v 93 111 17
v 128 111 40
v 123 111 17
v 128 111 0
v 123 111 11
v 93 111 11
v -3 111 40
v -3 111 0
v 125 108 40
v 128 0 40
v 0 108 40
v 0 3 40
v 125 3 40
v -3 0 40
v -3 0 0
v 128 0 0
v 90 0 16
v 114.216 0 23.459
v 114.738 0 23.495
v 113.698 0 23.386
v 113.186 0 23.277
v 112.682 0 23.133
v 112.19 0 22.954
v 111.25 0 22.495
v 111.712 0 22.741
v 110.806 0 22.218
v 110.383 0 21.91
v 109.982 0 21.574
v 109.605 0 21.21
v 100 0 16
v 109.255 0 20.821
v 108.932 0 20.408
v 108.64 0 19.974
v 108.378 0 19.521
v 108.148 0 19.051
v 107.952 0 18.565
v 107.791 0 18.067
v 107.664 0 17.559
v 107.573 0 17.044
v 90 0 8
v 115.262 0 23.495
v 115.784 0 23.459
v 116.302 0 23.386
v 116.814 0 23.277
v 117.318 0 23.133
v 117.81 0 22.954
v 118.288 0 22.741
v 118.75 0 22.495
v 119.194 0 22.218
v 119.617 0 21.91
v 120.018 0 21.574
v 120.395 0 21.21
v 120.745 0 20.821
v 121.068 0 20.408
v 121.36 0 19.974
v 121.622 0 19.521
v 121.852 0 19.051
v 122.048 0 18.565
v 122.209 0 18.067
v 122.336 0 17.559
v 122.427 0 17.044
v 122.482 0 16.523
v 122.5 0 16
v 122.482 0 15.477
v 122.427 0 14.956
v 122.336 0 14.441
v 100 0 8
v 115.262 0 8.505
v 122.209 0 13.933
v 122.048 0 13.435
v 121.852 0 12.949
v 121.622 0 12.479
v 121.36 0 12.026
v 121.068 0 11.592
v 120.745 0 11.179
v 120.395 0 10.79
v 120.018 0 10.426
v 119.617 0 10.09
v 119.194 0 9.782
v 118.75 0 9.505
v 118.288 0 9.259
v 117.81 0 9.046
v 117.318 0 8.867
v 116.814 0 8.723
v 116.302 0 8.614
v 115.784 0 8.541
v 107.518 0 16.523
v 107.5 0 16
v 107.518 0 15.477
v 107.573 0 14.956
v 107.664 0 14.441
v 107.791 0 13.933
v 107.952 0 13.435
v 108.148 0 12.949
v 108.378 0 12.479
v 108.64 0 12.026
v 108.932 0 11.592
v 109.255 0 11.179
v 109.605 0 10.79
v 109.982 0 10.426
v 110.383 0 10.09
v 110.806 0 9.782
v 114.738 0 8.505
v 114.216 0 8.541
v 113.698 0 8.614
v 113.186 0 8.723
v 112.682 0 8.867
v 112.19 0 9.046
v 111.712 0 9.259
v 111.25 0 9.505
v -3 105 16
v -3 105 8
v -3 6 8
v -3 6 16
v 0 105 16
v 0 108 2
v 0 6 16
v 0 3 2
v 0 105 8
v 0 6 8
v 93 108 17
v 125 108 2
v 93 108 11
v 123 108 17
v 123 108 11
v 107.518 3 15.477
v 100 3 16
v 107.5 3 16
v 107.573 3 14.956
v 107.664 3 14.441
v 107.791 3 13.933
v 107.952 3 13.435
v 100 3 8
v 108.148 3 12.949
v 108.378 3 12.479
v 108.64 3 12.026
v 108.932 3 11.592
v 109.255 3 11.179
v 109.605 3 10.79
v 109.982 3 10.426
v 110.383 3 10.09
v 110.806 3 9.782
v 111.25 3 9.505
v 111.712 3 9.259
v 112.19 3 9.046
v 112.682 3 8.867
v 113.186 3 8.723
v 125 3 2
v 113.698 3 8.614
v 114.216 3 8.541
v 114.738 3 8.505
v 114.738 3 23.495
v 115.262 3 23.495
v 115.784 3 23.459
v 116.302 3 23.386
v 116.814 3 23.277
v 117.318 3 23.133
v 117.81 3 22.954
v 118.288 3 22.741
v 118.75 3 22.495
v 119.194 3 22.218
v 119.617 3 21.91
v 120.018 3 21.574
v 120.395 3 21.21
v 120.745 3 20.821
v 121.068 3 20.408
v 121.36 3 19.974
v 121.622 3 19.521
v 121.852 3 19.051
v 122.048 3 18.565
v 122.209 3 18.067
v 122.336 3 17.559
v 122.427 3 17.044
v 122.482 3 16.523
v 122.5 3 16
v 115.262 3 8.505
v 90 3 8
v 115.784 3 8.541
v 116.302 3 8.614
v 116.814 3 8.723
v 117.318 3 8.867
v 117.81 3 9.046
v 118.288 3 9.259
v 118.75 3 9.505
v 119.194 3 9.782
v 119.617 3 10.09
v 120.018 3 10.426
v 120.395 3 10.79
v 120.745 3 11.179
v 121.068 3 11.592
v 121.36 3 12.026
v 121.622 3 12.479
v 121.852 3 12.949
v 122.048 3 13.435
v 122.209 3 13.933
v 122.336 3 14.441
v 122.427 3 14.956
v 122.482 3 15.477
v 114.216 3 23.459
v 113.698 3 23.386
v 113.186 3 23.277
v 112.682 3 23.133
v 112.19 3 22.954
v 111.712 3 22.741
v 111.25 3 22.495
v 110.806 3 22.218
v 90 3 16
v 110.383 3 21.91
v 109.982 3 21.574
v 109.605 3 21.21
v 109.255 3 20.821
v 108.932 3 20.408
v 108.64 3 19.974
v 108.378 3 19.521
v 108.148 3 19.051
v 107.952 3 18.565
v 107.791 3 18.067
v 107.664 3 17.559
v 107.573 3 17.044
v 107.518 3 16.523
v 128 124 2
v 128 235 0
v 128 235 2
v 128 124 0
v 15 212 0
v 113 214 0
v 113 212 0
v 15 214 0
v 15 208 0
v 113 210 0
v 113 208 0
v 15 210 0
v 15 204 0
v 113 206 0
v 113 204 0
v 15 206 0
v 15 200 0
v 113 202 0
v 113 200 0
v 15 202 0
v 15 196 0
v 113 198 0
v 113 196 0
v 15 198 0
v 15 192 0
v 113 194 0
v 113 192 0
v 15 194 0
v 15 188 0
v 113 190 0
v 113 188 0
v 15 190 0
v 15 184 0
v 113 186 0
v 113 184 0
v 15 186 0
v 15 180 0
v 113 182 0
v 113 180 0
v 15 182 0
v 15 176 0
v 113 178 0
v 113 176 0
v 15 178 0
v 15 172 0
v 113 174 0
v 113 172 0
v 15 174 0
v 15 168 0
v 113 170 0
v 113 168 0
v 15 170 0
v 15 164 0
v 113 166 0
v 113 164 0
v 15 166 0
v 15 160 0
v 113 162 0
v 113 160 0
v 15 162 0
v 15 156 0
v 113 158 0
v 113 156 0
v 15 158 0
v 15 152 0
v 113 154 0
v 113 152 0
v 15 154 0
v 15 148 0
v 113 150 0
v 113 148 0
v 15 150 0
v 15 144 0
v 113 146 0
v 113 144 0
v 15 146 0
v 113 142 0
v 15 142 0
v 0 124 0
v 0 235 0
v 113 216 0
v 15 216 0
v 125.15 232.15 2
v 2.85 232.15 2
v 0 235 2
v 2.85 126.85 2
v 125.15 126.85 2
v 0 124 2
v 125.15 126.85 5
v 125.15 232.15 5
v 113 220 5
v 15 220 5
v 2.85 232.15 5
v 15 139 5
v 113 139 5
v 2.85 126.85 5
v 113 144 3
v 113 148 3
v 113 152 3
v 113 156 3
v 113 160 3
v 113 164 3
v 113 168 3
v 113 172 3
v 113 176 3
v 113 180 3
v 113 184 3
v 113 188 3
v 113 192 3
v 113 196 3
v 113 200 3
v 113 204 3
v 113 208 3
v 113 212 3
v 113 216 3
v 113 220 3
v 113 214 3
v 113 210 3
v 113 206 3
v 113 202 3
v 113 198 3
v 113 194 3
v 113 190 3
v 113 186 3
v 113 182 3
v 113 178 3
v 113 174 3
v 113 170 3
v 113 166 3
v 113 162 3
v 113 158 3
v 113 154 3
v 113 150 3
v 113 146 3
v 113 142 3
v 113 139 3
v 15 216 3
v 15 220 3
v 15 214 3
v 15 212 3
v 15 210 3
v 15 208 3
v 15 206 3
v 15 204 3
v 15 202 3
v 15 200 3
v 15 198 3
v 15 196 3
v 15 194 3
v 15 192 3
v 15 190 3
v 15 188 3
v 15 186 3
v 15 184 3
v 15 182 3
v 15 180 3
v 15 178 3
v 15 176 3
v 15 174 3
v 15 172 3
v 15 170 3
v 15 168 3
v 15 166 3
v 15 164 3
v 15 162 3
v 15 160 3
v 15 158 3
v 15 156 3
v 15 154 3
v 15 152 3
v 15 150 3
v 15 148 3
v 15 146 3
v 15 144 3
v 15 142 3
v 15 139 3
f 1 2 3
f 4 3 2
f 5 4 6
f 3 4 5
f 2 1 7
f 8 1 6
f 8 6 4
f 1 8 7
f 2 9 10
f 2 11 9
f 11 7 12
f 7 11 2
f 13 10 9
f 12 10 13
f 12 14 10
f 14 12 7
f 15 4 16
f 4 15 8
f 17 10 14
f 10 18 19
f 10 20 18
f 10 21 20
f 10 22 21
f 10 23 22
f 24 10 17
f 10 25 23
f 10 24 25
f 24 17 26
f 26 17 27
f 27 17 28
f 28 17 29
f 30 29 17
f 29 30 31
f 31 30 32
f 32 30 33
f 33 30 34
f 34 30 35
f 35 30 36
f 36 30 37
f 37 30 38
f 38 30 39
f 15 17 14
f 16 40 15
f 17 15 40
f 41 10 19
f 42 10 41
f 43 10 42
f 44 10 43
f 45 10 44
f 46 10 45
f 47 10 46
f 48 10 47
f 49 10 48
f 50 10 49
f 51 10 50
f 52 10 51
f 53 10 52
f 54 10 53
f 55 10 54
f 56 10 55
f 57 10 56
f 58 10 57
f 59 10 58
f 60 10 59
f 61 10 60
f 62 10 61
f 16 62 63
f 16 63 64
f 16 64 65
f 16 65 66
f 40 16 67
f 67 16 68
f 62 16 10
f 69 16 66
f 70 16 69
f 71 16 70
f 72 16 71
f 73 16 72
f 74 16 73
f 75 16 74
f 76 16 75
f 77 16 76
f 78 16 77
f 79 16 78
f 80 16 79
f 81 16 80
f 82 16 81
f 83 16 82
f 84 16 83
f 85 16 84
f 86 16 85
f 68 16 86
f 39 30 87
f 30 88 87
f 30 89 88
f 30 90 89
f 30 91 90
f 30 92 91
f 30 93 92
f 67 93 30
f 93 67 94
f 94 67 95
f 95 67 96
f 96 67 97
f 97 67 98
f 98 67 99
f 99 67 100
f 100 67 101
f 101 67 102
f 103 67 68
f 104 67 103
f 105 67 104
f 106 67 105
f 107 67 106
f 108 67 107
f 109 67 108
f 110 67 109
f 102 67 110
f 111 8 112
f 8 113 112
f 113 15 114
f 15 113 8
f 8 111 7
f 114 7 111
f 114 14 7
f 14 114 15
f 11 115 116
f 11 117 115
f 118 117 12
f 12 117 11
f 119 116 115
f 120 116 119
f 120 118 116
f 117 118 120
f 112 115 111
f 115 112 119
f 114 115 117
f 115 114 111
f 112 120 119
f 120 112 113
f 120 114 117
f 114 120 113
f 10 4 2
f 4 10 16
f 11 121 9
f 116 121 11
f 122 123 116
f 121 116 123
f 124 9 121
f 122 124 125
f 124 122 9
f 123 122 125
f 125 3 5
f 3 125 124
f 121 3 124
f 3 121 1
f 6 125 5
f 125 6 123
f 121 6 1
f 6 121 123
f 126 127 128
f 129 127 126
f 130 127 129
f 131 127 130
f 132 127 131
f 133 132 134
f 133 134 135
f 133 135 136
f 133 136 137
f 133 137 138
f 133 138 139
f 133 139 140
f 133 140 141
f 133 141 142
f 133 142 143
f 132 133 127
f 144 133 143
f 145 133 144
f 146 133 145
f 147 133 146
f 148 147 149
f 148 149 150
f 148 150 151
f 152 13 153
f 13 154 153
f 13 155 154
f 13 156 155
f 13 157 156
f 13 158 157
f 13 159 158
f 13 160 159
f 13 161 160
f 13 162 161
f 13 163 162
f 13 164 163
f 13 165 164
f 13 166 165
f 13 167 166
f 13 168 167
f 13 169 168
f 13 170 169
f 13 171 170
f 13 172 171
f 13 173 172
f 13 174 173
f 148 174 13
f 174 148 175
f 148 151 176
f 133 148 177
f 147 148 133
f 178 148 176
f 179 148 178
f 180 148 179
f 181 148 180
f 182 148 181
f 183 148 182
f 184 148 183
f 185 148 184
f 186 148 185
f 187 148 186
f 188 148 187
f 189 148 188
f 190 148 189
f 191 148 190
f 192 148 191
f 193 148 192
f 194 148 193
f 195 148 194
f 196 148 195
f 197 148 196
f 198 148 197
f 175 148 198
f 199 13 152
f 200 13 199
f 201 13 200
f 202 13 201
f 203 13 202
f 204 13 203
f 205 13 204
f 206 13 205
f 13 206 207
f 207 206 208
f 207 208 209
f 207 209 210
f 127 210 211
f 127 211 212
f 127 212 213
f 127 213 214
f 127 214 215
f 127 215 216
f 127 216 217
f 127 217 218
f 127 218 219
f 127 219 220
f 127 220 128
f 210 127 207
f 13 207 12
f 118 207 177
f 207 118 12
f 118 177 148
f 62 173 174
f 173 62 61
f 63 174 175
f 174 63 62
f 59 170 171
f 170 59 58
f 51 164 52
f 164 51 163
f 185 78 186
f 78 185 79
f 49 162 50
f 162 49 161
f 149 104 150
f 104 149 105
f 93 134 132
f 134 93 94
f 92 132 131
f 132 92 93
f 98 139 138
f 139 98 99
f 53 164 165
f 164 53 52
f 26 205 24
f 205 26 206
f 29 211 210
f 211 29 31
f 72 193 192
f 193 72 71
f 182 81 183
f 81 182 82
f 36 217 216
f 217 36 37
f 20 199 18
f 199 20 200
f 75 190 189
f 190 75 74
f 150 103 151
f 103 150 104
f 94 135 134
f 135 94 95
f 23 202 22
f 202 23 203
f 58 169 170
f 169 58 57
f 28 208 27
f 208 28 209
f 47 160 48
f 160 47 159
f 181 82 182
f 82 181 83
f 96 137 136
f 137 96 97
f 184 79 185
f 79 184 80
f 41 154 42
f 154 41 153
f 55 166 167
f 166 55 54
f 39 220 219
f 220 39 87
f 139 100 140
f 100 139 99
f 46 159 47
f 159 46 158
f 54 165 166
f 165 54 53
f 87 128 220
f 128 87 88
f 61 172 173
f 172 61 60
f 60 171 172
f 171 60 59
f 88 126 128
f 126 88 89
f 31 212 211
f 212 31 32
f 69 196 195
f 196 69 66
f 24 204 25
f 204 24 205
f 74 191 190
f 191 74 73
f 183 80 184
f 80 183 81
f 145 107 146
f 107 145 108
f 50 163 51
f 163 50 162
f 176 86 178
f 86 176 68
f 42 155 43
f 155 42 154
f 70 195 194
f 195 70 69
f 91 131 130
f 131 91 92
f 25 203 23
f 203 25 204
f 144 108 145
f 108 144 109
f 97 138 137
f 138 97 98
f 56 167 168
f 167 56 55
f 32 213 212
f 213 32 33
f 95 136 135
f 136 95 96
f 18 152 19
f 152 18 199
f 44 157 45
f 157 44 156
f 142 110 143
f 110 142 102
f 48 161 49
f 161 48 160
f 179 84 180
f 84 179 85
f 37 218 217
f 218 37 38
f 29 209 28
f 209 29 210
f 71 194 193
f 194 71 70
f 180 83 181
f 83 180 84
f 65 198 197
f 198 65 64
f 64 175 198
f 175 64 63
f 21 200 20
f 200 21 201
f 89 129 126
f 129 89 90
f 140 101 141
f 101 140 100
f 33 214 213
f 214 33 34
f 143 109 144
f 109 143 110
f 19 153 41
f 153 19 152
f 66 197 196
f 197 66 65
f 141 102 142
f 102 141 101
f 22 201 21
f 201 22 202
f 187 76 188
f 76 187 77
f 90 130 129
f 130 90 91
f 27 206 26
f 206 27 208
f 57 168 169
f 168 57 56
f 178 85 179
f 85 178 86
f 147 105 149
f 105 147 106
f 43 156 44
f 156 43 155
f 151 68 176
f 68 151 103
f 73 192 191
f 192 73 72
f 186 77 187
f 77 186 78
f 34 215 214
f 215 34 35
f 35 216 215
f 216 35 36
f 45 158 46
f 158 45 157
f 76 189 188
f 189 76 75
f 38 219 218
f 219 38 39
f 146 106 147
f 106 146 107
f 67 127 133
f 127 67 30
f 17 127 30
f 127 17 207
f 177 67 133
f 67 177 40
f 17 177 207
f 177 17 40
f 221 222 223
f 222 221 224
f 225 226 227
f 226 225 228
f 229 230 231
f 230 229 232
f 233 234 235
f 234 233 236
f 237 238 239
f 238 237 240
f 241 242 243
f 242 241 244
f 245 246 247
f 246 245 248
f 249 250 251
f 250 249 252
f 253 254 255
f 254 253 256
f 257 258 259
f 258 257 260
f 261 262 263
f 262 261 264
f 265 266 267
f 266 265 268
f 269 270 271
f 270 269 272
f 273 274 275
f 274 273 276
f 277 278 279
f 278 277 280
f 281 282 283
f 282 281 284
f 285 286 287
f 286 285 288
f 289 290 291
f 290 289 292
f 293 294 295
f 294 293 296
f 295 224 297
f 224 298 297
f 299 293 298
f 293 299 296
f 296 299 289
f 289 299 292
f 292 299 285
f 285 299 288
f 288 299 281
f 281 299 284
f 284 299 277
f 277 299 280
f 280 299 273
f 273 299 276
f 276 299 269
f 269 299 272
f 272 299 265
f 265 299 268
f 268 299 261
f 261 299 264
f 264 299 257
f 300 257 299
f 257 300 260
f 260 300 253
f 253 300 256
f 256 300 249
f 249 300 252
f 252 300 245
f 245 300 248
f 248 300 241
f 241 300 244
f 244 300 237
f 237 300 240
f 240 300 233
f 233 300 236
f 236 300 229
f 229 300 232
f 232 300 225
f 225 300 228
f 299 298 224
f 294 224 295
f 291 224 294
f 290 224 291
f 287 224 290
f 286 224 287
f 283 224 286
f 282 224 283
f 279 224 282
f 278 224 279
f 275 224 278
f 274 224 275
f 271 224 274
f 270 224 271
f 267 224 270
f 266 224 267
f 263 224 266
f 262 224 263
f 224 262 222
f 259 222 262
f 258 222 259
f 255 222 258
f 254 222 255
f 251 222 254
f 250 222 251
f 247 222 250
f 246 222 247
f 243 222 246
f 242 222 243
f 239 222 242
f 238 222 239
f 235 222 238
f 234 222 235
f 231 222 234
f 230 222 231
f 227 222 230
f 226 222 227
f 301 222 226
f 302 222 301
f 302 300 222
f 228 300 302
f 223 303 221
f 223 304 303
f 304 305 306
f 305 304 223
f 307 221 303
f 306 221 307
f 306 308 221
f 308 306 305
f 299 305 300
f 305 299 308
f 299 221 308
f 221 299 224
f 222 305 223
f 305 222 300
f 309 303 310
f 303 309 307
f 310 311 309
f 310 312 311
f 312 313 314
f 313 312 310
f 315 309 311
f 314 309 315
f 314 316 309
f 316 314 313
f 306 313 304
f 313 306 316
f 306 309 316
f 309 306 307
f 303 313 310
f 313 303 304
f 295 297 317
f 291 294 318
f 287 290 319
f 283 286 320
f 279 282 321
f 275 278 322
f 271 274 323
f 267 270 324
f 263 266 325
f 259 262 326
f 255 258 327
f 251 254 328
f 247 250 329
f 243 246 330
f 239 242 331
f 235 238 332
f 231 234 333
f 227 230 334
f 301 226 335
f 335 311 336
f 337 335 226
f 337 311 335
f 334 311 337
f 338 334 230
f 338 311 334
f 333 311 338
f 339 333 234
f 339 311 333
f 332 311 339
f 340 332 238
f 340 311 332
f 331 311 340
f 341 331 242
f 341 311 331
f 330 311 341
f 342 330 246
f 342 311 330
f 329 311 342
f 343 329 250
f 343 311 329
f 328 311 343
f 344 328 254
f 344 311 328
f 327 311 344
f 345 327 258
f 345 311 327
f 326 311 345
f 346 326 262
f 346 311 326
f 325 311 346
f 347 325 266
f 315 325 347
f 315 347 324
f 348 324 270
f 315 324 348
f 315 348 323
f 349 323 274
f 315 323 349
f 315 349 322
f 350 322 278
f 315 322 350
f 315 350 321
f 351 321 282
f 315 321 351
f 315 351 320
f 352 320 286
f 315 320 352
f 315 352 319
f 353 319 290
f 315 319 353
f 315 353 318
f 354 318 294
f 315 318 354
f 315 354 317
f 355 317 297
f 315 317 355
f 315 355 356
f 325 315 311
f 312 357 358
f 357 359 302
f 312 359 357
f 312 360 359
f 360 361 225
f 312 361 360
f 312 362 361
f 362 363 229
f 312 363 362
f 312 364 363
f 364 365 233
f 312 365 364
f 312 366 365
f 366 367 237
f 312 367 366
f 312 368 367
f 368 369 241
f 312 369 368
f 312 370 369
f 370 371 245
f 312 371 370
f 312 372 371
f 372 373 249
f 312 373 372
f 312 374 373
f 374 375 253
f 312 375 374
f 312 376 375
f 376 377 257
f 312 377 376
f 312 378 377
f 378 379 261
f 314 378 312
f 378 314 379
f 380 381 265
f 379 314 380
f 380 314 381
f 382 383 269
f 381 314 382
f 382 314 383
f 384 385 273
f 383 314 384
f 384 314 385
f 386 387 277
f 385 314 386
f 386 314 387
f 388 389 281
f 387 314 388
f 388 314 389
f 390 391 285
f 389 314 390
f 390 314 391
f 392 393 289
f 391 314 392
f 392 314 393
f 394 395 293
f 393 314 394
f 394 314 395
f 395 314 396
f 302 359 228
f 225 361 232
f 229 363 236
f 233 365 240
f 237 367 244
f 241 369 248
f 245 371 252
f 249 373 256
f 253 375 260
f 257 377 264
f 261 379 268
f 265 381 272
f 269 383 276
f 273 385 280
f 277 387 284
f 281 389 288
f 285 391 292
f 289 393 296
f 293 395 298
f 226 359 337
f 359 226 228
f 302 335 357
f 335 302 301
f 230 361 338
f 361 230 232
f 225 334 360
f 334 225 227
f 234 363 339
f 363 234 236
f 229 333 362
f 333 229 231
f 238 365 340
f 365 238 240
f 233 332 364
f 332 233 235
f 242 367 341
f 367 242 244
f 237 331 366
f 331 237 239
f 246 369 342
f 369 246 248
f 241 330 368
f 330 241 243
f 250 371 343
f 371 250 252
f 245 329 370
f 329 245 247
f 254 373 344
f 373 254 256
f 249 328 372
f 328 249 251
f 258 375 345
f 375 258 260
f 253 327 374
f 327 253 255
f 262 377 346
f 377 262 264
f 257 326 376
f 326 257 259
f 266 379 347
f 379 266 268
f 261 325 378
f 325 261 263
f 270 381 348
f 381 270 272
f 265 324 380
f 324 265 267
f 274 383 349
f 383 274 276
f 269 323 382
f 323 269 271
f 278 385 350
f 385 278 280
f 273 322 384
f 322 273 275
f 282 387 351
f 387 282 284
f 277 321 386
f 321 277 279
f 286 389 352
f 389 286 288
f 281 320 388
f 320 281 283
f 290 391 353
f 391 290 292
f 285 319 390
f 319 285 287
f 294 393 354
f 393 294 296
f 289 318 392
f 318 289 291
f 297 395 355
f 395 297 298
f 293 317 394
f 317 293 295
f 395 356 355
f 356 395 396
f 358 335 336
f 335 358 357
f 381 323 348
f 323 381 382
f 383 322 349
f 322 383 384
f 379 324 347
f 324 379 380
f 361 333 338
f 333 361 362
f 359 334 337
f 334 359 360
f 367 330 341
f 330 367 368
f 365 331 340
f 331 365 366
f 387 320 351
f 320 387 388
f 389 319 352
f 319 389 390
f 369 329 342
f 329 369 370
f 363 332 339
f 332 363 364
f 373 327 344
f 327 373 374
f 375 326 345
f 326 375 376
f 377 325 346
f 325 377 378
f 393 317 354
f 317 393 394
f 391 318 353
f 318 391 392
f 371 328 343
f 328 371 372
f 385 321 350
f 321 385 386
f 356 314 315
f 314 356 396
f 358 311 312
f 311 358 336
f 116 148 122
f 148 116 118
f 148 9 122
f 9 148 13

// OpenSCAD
//Boks til liten forsterkerenhet.
//Dimensjoner
walls = 3;

inner_depth = 105;
inner_width = 122;

depth = inner_depth + 2 * walls;
width = inner_width + 2 * walls;

height = 40;

lid = 2;
lid_vents = 0.4; //how many percent of the lid should be vented?
vent_lid_hole_radius = 1.5;
lid_vents_marg = 5;
lid_vents_number = 20;
bottom = 2;

// Parameters for pin dimensions
pin_diameter = 2.5;  // Adjust diameter based on hole size on the ESP32
pin_height = 8;    // Height of the pins to hold the board

esp32_separation = 1;
esp32_power_width = 10;

// Parameters for ventilation grid
slot_width = 2;      // Width of each slot
slot_spacing = 4;   // Space between each slot
slot_margin = 15;    // Margin on each side for the slots
lid_insert = 3;
lid_pressure_plus = 0.3;


//Bottom
translate ([0,0,0]) cube([width, depth,bottom]);

//sides
//left
rotate([0,0,90])
translate ([0,0,0]) {
    difference () {
        cube([depth, walls,height]);

        translate([6, -1, bottom + 6])
            cube([depth-12, walls+2, 8]);
    }
}

//right
translate ([width-walls,0,0]){
    cube ([walls,depth,height]);
}

//back
translate([0,depth-walls,0]){
   difference(){
       cube ([width, walls, height]);
	   //put holes to cutout below here...
       //line in
       //translate([width-30,walls-1,10])rotate([90,0,0])cylinder(r=2,h=walls*2,center=true,$fn=90);
       //translate ([width-15,-2,10]) cube ([8.1,walls*2,12.1]);

    //    //RELAY opening
       translate([width - walls - 30 - 2, -2, bottom + 9])
            cube([30, walls+5, walls*2]);

    //    //cable opening
    //    translate([22, -2, bottom + 25])
    //         cube([25, walls+5, walls*2]);


    }
}
//front
translate([0,0,0]){
    union() {
        //Power Cable for ESP32 usb, supports usb-c

        difference(){
            cube ([width, walls, height]);

            // translate([width/2 - esp32_power_width/2, -1, bottom + 9])
            //     cube([esp32_power_width, walls + 2, walls+2]);


        //audio jack
        //    translate([width-walls-7, walls-1, bottom + 10 + 1.5])
        //         rotate([90,0,0])
        //         cylinder(r=3,h=walls*2,center=true,$fn=90);

        //sim card
            translate([width-walls-10, -1, bottom + 14])
                rotate([90,0,0])
                cylinder(r=7.5,h=walls*3,center=true,$fn=90);

            translate([width-walls-25-10, -1, bottom + 6])
                    cube([10, walls+2, 8]);

        //switch
        //    translate([walls+15, walls-1, bottom + 10 + 1.5])
        //         rotate([90,0,0])
        //         cylinder(r=15.5/2,h=walls*2,center=true,$fn=90);

        }
    }
}



// Lid with grid pattern
rotate([180, 0, 0]) {
    translate([0, -inner_depth * 2 - 25, -lid]) {
        difference() {
            union() {
                // Outer part of the lid
                translate([0, 0, 0]) cube([width, depth, lid]);

                // Inner part to hollow out the lid
                translate([walls - lid_pressure_plus / 2, walls - lid_pressure_plus / 2, -lid_insert])
                    cube([
                        width - 2 * walls + lid_pressure_plus,
                        depth - 2 * walls + lid_pressure_plus,
                        lid_insert]);

            }

            translate([slot_margin, slot_margin, -lid_insert-1])
                cube([width - 2 * slot_margin, depth - 2 * slot_margin, lid_insert]);

            // translate([slot_margin, slot_margin, +lid-lid_insert-5])
            //     cube([width - 2 * slot_margin, depth - 2 * slot_margin, lid_insert]);

            // Horizontal slots for ventilation with margins on all sides
            for (y = [slot_margin + slot_spacing : slot_spacing : depth - slot_margin - slot_spacing]) {
                translate([slot_margin, y, +lid-lid_insert-5])
                    cube([width - 2 * slot_margin, slot_width, lid + lid_insert + 5]);
            }

        }
    }
}
